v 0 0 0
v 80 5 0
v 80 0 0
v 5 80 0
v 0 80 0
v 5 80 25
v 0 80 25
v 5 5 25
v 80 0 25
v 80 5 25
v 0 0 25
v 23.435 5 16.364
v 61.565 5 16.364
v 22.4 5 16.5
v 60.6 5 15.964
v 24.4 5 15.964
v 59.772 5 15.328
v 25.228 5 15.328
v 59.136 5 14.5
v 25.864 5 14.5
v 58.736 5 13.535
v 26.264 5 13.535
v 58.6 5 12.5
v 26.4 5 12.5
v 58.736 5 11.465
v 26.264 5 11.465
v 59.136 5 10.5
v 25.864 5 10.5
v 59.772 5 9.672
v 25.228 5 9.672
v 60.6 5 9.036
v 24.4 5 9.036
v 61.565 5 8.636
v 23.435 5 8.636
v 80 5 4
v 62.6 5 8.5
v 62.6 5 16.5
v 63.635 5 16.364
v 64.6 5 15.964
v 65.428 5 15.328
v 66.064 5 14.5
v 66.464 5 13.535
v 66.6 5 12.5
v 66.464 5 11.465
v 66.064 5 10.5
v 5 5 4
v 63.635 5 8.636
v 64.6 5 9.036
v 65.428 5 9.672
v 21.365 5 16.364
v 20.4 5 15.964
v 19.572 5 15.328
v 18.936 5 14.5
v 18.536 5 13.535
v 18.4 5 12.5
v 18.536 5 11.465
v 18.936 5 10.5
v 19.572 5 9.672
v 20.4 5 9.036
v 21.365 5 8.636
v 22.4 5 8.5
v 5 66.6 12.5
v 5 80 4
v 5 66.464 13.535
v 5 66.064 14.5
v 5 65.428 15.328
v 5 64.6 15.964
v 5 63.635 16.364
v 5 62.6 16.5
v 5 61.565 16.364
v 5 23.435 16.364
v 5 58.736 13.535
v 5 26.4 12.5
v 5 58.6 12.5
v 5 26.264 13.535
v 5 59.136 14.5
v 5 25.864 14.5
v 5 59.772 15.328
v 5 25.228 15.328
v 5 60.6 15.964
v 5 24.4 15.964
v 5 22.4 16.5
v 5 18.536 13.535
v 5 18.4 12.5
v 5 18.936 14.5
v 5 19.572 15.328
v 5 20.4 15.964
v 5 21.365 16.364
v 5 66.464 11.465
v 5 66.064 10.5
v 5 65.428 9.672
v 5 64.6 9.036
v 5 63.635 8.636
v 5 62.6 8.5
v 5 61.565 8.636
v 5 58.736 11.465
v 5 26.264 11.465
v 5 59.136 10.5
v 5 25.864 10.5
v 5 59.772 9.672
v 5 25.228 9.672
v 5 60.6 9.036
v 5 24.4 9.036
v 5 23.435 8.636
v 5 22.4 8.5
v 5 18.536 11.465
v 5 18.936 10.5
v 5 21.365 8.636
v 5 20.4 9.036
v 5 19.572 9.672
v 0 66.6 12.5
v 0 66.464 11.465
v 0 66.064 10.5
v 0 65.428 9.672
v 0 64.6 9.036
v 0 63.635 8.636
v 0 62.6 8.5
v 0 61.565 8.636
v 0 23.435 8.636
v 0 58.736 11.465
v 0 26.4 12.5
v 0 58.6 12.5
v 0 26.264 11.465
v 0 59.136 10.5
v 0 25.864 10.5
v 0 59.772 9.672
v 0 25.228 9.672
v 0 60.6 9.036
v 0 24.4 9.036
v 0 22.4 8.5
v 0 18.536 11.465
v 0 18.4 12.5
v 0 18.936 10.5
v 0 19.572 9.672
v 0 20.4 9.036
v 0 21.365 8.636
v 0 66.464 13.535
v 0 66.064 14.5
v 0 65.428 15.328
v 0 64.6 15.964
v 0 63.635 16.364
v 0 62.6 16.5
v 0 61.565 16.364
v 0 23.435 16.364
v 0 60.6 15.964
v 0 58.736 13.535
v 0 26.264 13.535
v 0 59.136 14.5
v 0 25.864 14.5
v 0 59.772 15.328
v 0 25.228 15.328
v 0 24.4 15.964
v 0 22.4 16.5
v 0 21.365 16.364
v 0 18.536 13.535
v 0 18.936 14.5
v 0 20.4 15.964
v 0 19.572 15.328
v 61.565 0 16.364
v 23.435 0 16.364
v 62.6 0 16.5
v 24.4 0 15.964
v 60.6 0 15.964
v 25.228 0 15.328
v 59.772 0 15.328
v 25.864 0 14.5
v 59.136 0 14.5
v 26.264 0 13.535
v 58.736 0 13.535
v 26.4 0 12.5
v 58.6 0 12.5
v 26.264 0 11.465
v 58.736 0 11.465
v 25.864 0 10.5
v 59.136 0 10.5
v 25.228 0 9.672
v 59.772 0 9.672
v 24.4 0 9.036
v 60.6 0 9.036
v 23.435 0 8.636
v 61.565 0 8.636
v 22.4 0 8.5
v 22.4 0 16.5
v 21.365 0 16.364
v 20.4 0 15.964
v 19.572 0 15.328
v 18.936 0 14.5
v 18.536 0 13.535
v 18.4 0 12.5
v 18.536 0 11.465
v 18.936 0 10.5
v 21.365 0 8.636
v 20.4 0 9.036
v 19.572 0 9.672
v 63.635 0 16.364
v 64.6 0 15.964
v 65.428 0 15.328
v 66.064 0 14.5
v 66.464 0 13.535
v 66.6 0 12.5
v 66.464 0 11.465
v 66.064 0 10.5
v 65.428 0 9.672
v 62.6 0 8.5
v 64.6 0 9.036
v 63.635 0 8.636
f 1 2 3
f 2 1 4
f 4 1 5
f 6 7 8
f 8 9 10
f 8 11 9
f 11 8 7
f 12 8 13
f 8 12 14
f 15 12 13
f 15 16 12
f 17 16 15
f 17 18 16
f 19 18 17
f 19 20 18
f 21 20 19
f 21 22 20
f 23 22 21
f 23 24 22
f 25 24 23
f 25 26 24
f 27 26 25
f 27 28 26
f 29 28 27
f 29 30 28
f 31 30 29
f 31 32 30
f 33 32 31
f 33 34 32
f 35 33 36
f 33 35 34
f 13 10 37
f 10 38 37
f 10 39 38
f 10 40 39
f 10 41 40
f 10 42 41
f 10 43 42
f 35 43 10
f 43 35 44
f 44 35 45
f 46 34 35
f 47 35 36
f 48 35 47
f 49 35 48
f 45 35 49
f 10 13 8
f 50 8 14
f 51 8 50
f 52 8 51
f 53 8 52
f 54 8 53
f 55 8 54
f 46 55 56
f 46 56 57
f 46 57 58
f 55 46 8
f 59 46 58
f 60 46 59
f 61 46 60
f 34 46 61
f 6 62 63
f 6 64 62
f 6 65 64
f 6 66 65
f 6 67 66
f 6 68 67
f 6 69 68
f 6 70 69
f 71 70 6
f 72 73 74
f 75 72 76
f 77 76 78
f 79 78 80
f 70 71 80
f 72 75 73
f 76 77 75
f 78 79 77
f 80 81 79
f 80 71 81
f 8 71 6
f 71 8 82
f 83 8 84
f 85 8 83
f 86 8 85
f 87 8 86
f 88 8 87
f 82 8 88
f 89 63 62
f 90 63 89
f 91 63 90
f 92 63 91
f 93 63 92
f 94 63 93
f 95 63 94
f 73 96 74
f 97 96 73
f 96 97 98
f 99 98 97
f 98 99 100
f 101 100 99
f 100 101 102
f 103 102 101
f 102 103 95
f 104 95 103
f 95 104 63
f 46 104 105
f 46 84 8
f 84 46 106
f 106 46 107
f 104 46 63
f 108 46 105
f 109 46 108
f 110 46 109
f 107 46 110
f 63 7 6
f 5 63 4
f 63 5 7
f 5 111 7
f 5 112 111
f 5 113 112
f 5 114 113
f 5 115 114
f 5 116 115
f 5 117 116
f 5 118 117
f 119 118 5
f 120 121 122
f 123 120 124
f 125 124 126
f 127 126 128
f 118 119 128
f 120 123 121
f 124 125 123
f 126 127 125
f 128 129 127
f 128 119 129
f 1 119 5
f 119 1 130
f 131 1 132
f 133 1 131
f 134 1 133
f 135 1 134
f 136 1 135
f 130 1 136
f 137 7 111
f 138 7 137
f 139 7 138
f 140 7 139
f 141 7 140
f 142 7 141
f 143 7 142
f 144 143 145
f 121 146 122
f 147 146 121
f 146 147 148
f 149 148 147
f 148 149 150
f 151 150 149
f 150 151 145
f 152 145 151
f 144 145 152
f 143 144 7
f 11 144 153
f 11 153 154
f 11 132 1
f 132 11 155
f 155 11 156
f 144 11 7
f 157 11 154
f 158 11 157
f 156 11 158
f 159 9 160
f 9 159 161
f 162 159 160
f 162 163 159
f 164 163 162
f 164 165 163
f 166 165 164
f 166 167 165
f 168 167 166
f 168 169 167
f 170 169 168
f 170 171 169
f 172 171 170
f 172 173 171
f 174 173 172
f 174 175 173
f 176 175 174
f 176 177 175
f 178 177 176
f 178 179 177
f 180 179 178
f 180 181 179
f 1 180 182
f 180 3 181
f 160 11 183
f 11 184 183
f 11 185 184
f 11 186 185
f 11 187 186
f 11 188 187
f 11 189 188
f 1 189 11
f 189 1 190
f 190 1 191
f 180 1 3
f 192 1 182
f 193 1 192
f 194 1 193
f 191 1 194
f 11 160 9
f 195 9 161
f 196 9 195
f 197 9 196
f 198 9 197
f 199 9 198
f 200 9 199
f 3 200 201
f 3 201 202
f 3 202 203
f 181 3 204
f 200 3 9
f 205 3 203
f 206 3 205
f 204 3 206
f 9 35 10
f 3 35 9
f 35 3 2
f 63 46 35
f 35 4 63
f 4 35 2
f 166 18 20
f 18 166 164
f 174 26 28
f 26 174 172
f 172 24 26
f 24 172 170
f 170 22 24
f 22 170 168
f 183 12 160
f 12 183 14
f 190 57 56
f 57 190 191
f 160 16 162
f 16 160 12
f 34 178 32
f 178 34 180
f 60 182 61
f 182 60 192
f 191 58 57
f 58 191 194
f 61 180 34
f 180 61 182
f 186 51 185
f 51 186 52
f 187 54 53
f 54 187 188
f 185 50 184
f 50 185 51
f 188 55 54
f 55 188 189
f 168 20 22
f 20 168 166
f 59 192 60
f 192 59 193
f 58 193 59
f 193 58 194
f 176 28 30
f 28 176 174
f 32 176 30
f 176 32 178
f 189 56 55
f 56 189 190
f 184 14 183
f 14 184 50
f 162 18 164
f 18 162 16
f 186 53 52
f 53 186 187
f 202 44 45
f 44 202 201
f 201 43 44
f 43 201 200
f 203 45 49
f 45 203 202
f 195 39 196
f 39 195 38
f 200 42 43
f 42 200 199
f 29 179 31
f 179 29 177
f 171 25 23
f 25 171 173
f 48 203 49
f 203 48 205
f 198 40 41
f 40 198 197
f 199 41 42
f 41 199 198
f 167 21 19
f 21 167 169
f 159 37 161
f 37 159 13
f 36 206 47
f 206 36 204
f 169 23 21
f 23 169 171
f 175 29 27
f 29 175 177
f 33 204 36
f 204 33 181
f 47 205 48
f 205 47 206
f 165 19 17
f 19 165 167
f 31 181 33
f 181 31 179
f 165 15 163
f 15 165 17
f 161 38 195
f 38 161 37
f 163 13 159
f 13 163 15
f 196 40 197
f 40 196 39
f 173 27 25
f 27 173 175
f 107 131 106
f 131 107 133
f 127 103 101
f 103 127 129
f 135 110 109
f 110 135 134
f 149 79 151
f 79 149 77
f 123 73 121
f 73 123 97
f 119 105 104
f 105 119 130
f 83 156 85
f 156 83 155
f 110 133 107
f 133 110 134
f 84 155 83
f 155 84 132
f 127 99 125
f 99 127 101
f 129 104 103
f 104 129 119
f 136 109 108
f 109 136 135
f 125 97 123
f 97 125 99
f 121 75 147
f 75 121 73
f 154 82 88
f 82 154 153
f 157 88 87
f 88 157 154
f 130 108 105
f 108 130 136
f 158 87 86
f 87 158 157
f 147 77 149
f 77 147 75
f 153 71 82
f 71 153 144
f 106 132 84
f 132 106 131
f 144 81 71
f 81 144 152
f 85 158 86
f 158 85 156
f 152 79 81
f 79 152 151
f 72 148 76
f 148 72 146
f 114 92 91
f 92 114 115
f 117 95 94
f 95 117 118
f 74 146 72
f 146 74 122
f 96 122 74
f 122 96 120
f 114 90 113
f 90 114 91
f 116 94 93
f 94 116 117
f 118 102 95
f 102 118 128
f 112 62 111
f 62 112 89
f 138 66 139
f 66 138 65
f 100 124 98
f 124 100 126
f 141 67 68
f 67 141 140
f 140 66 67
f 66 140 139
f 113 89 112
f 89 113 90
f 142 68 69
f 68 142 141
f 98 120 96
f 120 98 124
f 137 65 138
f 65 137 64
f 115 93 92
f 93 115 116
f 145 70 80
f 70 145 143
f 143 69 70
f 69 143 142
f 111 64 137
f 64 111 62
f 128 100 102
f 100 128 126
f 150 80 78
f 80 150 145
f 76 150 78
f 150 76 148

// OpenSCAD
// [FL_INDEX: keywords="openscad, 3d_parametric, Braced_Angle_Bracket, csg_solid" | COT="Parametric OpenSCAD design from 3DCodeverse"]
// Title: Braced Angle Bracket

// preview[view:north east, tilt:top diagonal]

/* [Dimensions] */

span = 80;

bracket_thickness = 5;

bracket_width = 25;

// Brace thickness is limited to prevent obstructing holes.
brace_thickness = 4;

// You may want to re-orient the model before printing if you change which braces are enabled.
top_brace = 0; // [0:Off, 1:On]

bottom_brace = 1; // [0:Off, 1:On]

hole_diameter = 8;

// Position  as a percentage of distance from corner to edge.
inner_hole_position = 20; // [0:100]

// Position as a percentage of distance from corner to edge.
outer_hole_position = 80; // [0:100]

// Select Inner Face to center holes in space available above/between braces.
hole_centering = 0; // [0:Outer Face, 1:Inner Face]

/* [Hidden] */

hole_radius = hole_diameter / 2;
get_bracket_width = max(bracket_width, hole_diameter);
get_brace_thickness = min(brace_thickness, bracket_width/2 - hole_radius);
get_inner_hole_spacing = inner_hole_position / 100;
get_outer_hole_spacing = outer_hole_position / 100;
hole_height = (hole_centering == 0 ? bracket_width/2 :  (bracket_width - (top_brace * get_brace_thickness) - (bottom_brace * get_brace_thickness))/2 + (bottom_brace * get_brace_thickness));

// Bracket points form an "L" shape; [0, 0] is the outer corner of the bracket.
module bracket() {
	linear_extrude(height=get_bracket_width)
		polygon(points=[[0, 0], [span, 0], [span, bracket_thickness], [bracket_thickness, bracket_thickness], [bracket_thickness, span], [0, span]]);
}	

// Brace points form a triangle; [bracket_thickness, bracket_thickness] is the inner corner of the bracket.
module brace() {
	linear_extrude(height=get_brace_thickness)
		polygon(points=[[bracket_thickness, bracket_thickness], [span, bracket_thickness], [bracket_thickness, span]]);
}

module hole() {
	cylinder(h = bracket_thickness + 2, r = hole_radius, $fn = 24);
}

module left_hole(spacing) {
	translate([bracket_thickness + hole_radius + (spacing * (span - bracket_thickness - hole_diameter)), -1, hole_height])
		rotate([-90, 0, 0])
			hole();
}

module top_hole(spacing) {
	translate([-1, bracket_thickness + hole_radius + (spacing * (span - bracket_thickness - hole_diameter)), hole_height])
		rotate([0, 90, 0])
			hole();
}


difference() {
	union() {
		bracket();		

		if (bottom_brace == 1) {
			brace();
		}

		if (top_brace == 1) {
			translate([0, 0, get_bracket_width - get_brace_thickness]) brace();
		}
	}

	left_hole(get_inner_hole_spacing);
	left_hole(get_outer_hole_spacing);

	top_hole(get_inner_hole_spacing);
	top_hole(get_outer_hole_spacing);
}
